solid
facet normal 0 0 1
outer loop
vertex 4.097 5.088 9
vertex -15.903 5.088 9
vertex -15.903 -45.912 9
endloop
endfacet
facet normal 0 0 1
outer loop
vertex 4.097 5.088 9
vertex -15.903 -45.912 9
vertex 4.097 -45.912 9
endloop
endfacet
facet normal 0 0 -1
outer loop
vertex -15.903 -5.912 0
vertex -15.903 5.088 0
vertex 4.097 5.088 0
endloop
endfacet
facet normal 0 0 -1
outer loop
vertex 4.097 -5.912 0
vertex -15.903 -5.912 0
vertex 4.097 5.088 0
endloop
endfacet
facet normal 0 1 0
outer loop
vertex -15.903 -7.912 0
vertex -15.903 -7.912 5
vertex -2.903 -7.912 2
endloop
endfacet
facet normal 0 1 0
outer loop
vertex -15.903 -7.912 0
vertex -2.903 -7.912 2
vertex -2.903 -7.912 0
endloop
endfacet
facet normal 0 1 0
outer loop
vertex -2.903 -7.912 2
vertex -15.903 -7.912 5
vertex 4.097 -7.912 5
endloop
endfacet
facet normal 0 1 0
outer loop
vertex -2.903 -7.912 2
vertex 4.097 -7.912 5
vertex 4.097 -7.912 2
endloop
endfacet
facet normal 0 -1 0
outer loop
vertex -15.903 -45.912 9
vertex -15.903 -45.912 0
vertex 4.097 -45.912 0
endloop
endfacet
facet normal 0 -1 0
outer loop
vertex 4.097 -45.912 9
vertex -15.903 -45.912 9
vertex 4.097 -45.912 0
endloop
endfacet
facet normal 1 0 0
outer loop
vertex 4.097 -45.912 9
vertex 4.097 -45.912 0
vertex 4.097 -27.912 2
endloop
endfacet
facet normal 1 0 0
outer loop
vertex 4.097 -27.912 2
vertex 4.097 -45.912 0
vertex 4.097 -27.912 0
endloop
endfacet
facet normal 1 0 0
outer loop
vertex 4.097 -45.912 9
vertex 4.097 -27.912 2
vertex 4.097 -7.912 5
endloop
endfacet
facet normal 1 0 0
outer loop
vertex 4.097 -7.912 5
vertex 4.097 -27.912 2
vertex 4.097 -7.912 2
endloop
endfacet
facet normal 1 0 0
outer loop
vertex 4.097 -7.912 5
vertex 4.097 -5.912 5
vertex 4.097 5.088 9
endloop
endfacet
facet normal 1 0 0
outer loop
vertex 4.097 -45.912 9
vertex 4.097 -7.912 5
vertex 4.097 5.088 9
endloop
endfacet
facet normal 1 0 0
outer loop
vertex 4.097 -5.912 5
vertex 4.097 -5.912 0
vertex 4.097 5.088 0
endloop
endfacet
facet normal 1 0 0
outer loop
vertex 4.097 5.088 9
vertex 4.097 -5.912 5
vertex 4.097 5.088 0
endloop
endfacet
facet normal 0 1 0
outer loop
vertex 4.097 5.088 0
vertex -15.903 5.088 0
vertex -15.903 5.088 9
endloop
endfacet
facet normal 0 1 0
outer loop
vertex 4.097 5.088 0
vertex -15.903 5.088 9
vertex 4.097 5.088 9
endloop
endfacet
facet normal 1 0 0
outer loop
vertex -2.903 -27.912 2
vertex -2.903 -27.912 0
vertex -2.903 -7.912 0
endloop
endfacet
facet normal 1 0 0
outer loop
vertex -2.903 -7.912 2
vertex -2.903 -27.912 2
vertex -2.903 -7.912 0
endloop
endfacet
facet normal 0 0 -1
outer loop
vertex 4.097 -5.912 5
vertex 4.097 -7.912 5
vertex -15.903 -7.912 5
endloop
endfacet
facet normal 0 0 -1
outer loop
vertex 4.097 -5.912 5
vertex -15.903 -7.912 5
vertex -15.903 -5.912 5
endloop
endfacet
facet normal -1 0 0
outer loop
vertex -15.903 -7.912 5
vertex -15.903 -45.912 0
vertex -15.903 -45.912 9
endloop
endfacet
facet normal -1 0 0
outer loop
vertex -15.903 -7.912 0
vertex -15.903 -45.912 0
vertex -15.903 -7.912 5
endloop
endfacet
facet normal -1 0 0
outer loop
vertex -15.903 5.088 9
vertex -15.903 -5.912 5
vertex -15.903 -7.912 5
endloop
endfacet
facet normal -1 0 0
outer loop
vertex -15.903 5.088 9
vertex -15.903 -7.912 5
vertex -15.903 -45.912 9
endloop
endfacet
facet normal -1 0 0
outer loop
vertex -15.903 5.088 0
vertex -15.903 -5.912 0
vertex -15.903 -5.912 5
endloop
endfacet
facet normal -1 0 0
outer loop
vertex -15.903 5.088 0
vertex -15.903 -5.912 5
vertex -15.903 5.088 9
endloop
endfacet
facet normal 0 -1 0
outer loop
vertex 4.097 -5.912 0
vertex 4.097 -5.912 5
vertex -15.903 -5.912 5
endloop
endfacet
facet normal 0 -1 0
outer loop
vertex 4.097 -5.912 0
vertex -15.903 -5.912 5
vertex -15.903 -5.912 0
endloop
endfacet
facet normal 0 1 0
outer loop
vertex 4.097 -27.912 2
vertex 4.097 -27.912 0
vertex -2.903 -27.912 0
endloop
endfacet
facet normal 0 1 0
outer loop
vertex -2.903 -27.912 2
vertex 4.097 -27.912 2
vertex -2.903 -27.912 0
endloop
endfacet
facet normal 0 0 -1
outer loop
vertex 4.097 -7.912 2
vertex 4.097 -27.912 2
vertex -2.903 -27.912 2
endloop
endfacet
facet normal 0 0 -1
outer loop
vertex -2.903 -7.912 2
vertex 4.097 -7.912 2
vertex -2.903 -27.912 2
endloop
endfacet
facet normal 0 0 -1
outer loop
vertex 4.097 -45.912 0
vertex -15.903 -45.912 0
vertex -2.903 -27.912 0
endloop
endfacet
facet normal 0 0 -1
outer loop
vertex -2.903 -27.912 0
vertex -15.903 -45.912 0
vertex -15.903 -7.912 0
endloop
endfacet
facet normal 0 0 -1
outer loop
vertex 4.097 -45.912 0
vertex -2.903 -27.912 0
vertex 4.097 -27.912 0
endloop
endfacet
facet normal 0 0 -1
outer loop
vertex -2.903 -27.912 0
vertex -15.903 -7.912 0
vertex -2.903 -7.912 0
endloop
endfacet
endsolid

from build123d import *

# Parameters (mm, degrees)
ESQUISSE1_W             = 20
ESQUISSE1_H             = 51
EXTRUSION1_DEPTH        = 9
ESQUISSE3_W             = 7
ESQUISSE3_H             = 20
ENL_V_MAT_EXTRU_1_DEPTH = 2
ENL_V_MAT_EXTRU_2_REACH = 52.881
ESQUISSE4_W             = 5
ESQUISSE4_H             = 2


with BuildPart() as part:
    # Esquisse1 → Extrusion1 (new body)
    with BuildSketch(Plane.XY):
        with Locations((-5.903123543, -20.411538462)):
            Rectangle(ESQUISSE1_W, ESQUISSE1_H)
    extrude(amount=EXTRUSION1_DEPTH)

    # Esquisse3 → Enlèv. mat.-Extru.1 (cut)
    with BuildSketch(Plane(origin=(0, 0, 0), x_dir=(-1, 0, 0), z_dir=(0, 0, -1))):
        with Locations((-0.596876457, -17.911538462)):
            Rectangle(ESQUISSE3_W, ESQUISSE3_H)
    extrude(amount=-ENL_V_MAT_EXTRU_1_DEPTH, mode=Mode.SUBTRACT)

    # Esquisse4 → Enlèv. mat.-Extru.2 (cut, up to next)
    with BuildSketch(Plane(origin=(4.096876457, 0, 0), x_dir=(0, 0, -1), z_dir=(1, 0, 0)), mode=Mode.PRIVATE) as enl_v_mat_extru_2_sk1:
        with Locations((-2.5, -6.911538462)):
            Rectangle(ESQUISSE4_W, ESQUISSE4_H)
    enl_v_mat_extru_2_tool1 = extrude(enl_v_mat_extru_2_sk1.sketch, amount=-ENL_V_MAT_EXTRU_2_REACH, mode=Mode.PRIVATE) & part.part
    add(enl_v_mat_extru_2_tool1.solids().sort_by_distance((4.096876, -6.911538, 2.5))[0], mode=Mode.SUBTRACT)


solid = part.part
